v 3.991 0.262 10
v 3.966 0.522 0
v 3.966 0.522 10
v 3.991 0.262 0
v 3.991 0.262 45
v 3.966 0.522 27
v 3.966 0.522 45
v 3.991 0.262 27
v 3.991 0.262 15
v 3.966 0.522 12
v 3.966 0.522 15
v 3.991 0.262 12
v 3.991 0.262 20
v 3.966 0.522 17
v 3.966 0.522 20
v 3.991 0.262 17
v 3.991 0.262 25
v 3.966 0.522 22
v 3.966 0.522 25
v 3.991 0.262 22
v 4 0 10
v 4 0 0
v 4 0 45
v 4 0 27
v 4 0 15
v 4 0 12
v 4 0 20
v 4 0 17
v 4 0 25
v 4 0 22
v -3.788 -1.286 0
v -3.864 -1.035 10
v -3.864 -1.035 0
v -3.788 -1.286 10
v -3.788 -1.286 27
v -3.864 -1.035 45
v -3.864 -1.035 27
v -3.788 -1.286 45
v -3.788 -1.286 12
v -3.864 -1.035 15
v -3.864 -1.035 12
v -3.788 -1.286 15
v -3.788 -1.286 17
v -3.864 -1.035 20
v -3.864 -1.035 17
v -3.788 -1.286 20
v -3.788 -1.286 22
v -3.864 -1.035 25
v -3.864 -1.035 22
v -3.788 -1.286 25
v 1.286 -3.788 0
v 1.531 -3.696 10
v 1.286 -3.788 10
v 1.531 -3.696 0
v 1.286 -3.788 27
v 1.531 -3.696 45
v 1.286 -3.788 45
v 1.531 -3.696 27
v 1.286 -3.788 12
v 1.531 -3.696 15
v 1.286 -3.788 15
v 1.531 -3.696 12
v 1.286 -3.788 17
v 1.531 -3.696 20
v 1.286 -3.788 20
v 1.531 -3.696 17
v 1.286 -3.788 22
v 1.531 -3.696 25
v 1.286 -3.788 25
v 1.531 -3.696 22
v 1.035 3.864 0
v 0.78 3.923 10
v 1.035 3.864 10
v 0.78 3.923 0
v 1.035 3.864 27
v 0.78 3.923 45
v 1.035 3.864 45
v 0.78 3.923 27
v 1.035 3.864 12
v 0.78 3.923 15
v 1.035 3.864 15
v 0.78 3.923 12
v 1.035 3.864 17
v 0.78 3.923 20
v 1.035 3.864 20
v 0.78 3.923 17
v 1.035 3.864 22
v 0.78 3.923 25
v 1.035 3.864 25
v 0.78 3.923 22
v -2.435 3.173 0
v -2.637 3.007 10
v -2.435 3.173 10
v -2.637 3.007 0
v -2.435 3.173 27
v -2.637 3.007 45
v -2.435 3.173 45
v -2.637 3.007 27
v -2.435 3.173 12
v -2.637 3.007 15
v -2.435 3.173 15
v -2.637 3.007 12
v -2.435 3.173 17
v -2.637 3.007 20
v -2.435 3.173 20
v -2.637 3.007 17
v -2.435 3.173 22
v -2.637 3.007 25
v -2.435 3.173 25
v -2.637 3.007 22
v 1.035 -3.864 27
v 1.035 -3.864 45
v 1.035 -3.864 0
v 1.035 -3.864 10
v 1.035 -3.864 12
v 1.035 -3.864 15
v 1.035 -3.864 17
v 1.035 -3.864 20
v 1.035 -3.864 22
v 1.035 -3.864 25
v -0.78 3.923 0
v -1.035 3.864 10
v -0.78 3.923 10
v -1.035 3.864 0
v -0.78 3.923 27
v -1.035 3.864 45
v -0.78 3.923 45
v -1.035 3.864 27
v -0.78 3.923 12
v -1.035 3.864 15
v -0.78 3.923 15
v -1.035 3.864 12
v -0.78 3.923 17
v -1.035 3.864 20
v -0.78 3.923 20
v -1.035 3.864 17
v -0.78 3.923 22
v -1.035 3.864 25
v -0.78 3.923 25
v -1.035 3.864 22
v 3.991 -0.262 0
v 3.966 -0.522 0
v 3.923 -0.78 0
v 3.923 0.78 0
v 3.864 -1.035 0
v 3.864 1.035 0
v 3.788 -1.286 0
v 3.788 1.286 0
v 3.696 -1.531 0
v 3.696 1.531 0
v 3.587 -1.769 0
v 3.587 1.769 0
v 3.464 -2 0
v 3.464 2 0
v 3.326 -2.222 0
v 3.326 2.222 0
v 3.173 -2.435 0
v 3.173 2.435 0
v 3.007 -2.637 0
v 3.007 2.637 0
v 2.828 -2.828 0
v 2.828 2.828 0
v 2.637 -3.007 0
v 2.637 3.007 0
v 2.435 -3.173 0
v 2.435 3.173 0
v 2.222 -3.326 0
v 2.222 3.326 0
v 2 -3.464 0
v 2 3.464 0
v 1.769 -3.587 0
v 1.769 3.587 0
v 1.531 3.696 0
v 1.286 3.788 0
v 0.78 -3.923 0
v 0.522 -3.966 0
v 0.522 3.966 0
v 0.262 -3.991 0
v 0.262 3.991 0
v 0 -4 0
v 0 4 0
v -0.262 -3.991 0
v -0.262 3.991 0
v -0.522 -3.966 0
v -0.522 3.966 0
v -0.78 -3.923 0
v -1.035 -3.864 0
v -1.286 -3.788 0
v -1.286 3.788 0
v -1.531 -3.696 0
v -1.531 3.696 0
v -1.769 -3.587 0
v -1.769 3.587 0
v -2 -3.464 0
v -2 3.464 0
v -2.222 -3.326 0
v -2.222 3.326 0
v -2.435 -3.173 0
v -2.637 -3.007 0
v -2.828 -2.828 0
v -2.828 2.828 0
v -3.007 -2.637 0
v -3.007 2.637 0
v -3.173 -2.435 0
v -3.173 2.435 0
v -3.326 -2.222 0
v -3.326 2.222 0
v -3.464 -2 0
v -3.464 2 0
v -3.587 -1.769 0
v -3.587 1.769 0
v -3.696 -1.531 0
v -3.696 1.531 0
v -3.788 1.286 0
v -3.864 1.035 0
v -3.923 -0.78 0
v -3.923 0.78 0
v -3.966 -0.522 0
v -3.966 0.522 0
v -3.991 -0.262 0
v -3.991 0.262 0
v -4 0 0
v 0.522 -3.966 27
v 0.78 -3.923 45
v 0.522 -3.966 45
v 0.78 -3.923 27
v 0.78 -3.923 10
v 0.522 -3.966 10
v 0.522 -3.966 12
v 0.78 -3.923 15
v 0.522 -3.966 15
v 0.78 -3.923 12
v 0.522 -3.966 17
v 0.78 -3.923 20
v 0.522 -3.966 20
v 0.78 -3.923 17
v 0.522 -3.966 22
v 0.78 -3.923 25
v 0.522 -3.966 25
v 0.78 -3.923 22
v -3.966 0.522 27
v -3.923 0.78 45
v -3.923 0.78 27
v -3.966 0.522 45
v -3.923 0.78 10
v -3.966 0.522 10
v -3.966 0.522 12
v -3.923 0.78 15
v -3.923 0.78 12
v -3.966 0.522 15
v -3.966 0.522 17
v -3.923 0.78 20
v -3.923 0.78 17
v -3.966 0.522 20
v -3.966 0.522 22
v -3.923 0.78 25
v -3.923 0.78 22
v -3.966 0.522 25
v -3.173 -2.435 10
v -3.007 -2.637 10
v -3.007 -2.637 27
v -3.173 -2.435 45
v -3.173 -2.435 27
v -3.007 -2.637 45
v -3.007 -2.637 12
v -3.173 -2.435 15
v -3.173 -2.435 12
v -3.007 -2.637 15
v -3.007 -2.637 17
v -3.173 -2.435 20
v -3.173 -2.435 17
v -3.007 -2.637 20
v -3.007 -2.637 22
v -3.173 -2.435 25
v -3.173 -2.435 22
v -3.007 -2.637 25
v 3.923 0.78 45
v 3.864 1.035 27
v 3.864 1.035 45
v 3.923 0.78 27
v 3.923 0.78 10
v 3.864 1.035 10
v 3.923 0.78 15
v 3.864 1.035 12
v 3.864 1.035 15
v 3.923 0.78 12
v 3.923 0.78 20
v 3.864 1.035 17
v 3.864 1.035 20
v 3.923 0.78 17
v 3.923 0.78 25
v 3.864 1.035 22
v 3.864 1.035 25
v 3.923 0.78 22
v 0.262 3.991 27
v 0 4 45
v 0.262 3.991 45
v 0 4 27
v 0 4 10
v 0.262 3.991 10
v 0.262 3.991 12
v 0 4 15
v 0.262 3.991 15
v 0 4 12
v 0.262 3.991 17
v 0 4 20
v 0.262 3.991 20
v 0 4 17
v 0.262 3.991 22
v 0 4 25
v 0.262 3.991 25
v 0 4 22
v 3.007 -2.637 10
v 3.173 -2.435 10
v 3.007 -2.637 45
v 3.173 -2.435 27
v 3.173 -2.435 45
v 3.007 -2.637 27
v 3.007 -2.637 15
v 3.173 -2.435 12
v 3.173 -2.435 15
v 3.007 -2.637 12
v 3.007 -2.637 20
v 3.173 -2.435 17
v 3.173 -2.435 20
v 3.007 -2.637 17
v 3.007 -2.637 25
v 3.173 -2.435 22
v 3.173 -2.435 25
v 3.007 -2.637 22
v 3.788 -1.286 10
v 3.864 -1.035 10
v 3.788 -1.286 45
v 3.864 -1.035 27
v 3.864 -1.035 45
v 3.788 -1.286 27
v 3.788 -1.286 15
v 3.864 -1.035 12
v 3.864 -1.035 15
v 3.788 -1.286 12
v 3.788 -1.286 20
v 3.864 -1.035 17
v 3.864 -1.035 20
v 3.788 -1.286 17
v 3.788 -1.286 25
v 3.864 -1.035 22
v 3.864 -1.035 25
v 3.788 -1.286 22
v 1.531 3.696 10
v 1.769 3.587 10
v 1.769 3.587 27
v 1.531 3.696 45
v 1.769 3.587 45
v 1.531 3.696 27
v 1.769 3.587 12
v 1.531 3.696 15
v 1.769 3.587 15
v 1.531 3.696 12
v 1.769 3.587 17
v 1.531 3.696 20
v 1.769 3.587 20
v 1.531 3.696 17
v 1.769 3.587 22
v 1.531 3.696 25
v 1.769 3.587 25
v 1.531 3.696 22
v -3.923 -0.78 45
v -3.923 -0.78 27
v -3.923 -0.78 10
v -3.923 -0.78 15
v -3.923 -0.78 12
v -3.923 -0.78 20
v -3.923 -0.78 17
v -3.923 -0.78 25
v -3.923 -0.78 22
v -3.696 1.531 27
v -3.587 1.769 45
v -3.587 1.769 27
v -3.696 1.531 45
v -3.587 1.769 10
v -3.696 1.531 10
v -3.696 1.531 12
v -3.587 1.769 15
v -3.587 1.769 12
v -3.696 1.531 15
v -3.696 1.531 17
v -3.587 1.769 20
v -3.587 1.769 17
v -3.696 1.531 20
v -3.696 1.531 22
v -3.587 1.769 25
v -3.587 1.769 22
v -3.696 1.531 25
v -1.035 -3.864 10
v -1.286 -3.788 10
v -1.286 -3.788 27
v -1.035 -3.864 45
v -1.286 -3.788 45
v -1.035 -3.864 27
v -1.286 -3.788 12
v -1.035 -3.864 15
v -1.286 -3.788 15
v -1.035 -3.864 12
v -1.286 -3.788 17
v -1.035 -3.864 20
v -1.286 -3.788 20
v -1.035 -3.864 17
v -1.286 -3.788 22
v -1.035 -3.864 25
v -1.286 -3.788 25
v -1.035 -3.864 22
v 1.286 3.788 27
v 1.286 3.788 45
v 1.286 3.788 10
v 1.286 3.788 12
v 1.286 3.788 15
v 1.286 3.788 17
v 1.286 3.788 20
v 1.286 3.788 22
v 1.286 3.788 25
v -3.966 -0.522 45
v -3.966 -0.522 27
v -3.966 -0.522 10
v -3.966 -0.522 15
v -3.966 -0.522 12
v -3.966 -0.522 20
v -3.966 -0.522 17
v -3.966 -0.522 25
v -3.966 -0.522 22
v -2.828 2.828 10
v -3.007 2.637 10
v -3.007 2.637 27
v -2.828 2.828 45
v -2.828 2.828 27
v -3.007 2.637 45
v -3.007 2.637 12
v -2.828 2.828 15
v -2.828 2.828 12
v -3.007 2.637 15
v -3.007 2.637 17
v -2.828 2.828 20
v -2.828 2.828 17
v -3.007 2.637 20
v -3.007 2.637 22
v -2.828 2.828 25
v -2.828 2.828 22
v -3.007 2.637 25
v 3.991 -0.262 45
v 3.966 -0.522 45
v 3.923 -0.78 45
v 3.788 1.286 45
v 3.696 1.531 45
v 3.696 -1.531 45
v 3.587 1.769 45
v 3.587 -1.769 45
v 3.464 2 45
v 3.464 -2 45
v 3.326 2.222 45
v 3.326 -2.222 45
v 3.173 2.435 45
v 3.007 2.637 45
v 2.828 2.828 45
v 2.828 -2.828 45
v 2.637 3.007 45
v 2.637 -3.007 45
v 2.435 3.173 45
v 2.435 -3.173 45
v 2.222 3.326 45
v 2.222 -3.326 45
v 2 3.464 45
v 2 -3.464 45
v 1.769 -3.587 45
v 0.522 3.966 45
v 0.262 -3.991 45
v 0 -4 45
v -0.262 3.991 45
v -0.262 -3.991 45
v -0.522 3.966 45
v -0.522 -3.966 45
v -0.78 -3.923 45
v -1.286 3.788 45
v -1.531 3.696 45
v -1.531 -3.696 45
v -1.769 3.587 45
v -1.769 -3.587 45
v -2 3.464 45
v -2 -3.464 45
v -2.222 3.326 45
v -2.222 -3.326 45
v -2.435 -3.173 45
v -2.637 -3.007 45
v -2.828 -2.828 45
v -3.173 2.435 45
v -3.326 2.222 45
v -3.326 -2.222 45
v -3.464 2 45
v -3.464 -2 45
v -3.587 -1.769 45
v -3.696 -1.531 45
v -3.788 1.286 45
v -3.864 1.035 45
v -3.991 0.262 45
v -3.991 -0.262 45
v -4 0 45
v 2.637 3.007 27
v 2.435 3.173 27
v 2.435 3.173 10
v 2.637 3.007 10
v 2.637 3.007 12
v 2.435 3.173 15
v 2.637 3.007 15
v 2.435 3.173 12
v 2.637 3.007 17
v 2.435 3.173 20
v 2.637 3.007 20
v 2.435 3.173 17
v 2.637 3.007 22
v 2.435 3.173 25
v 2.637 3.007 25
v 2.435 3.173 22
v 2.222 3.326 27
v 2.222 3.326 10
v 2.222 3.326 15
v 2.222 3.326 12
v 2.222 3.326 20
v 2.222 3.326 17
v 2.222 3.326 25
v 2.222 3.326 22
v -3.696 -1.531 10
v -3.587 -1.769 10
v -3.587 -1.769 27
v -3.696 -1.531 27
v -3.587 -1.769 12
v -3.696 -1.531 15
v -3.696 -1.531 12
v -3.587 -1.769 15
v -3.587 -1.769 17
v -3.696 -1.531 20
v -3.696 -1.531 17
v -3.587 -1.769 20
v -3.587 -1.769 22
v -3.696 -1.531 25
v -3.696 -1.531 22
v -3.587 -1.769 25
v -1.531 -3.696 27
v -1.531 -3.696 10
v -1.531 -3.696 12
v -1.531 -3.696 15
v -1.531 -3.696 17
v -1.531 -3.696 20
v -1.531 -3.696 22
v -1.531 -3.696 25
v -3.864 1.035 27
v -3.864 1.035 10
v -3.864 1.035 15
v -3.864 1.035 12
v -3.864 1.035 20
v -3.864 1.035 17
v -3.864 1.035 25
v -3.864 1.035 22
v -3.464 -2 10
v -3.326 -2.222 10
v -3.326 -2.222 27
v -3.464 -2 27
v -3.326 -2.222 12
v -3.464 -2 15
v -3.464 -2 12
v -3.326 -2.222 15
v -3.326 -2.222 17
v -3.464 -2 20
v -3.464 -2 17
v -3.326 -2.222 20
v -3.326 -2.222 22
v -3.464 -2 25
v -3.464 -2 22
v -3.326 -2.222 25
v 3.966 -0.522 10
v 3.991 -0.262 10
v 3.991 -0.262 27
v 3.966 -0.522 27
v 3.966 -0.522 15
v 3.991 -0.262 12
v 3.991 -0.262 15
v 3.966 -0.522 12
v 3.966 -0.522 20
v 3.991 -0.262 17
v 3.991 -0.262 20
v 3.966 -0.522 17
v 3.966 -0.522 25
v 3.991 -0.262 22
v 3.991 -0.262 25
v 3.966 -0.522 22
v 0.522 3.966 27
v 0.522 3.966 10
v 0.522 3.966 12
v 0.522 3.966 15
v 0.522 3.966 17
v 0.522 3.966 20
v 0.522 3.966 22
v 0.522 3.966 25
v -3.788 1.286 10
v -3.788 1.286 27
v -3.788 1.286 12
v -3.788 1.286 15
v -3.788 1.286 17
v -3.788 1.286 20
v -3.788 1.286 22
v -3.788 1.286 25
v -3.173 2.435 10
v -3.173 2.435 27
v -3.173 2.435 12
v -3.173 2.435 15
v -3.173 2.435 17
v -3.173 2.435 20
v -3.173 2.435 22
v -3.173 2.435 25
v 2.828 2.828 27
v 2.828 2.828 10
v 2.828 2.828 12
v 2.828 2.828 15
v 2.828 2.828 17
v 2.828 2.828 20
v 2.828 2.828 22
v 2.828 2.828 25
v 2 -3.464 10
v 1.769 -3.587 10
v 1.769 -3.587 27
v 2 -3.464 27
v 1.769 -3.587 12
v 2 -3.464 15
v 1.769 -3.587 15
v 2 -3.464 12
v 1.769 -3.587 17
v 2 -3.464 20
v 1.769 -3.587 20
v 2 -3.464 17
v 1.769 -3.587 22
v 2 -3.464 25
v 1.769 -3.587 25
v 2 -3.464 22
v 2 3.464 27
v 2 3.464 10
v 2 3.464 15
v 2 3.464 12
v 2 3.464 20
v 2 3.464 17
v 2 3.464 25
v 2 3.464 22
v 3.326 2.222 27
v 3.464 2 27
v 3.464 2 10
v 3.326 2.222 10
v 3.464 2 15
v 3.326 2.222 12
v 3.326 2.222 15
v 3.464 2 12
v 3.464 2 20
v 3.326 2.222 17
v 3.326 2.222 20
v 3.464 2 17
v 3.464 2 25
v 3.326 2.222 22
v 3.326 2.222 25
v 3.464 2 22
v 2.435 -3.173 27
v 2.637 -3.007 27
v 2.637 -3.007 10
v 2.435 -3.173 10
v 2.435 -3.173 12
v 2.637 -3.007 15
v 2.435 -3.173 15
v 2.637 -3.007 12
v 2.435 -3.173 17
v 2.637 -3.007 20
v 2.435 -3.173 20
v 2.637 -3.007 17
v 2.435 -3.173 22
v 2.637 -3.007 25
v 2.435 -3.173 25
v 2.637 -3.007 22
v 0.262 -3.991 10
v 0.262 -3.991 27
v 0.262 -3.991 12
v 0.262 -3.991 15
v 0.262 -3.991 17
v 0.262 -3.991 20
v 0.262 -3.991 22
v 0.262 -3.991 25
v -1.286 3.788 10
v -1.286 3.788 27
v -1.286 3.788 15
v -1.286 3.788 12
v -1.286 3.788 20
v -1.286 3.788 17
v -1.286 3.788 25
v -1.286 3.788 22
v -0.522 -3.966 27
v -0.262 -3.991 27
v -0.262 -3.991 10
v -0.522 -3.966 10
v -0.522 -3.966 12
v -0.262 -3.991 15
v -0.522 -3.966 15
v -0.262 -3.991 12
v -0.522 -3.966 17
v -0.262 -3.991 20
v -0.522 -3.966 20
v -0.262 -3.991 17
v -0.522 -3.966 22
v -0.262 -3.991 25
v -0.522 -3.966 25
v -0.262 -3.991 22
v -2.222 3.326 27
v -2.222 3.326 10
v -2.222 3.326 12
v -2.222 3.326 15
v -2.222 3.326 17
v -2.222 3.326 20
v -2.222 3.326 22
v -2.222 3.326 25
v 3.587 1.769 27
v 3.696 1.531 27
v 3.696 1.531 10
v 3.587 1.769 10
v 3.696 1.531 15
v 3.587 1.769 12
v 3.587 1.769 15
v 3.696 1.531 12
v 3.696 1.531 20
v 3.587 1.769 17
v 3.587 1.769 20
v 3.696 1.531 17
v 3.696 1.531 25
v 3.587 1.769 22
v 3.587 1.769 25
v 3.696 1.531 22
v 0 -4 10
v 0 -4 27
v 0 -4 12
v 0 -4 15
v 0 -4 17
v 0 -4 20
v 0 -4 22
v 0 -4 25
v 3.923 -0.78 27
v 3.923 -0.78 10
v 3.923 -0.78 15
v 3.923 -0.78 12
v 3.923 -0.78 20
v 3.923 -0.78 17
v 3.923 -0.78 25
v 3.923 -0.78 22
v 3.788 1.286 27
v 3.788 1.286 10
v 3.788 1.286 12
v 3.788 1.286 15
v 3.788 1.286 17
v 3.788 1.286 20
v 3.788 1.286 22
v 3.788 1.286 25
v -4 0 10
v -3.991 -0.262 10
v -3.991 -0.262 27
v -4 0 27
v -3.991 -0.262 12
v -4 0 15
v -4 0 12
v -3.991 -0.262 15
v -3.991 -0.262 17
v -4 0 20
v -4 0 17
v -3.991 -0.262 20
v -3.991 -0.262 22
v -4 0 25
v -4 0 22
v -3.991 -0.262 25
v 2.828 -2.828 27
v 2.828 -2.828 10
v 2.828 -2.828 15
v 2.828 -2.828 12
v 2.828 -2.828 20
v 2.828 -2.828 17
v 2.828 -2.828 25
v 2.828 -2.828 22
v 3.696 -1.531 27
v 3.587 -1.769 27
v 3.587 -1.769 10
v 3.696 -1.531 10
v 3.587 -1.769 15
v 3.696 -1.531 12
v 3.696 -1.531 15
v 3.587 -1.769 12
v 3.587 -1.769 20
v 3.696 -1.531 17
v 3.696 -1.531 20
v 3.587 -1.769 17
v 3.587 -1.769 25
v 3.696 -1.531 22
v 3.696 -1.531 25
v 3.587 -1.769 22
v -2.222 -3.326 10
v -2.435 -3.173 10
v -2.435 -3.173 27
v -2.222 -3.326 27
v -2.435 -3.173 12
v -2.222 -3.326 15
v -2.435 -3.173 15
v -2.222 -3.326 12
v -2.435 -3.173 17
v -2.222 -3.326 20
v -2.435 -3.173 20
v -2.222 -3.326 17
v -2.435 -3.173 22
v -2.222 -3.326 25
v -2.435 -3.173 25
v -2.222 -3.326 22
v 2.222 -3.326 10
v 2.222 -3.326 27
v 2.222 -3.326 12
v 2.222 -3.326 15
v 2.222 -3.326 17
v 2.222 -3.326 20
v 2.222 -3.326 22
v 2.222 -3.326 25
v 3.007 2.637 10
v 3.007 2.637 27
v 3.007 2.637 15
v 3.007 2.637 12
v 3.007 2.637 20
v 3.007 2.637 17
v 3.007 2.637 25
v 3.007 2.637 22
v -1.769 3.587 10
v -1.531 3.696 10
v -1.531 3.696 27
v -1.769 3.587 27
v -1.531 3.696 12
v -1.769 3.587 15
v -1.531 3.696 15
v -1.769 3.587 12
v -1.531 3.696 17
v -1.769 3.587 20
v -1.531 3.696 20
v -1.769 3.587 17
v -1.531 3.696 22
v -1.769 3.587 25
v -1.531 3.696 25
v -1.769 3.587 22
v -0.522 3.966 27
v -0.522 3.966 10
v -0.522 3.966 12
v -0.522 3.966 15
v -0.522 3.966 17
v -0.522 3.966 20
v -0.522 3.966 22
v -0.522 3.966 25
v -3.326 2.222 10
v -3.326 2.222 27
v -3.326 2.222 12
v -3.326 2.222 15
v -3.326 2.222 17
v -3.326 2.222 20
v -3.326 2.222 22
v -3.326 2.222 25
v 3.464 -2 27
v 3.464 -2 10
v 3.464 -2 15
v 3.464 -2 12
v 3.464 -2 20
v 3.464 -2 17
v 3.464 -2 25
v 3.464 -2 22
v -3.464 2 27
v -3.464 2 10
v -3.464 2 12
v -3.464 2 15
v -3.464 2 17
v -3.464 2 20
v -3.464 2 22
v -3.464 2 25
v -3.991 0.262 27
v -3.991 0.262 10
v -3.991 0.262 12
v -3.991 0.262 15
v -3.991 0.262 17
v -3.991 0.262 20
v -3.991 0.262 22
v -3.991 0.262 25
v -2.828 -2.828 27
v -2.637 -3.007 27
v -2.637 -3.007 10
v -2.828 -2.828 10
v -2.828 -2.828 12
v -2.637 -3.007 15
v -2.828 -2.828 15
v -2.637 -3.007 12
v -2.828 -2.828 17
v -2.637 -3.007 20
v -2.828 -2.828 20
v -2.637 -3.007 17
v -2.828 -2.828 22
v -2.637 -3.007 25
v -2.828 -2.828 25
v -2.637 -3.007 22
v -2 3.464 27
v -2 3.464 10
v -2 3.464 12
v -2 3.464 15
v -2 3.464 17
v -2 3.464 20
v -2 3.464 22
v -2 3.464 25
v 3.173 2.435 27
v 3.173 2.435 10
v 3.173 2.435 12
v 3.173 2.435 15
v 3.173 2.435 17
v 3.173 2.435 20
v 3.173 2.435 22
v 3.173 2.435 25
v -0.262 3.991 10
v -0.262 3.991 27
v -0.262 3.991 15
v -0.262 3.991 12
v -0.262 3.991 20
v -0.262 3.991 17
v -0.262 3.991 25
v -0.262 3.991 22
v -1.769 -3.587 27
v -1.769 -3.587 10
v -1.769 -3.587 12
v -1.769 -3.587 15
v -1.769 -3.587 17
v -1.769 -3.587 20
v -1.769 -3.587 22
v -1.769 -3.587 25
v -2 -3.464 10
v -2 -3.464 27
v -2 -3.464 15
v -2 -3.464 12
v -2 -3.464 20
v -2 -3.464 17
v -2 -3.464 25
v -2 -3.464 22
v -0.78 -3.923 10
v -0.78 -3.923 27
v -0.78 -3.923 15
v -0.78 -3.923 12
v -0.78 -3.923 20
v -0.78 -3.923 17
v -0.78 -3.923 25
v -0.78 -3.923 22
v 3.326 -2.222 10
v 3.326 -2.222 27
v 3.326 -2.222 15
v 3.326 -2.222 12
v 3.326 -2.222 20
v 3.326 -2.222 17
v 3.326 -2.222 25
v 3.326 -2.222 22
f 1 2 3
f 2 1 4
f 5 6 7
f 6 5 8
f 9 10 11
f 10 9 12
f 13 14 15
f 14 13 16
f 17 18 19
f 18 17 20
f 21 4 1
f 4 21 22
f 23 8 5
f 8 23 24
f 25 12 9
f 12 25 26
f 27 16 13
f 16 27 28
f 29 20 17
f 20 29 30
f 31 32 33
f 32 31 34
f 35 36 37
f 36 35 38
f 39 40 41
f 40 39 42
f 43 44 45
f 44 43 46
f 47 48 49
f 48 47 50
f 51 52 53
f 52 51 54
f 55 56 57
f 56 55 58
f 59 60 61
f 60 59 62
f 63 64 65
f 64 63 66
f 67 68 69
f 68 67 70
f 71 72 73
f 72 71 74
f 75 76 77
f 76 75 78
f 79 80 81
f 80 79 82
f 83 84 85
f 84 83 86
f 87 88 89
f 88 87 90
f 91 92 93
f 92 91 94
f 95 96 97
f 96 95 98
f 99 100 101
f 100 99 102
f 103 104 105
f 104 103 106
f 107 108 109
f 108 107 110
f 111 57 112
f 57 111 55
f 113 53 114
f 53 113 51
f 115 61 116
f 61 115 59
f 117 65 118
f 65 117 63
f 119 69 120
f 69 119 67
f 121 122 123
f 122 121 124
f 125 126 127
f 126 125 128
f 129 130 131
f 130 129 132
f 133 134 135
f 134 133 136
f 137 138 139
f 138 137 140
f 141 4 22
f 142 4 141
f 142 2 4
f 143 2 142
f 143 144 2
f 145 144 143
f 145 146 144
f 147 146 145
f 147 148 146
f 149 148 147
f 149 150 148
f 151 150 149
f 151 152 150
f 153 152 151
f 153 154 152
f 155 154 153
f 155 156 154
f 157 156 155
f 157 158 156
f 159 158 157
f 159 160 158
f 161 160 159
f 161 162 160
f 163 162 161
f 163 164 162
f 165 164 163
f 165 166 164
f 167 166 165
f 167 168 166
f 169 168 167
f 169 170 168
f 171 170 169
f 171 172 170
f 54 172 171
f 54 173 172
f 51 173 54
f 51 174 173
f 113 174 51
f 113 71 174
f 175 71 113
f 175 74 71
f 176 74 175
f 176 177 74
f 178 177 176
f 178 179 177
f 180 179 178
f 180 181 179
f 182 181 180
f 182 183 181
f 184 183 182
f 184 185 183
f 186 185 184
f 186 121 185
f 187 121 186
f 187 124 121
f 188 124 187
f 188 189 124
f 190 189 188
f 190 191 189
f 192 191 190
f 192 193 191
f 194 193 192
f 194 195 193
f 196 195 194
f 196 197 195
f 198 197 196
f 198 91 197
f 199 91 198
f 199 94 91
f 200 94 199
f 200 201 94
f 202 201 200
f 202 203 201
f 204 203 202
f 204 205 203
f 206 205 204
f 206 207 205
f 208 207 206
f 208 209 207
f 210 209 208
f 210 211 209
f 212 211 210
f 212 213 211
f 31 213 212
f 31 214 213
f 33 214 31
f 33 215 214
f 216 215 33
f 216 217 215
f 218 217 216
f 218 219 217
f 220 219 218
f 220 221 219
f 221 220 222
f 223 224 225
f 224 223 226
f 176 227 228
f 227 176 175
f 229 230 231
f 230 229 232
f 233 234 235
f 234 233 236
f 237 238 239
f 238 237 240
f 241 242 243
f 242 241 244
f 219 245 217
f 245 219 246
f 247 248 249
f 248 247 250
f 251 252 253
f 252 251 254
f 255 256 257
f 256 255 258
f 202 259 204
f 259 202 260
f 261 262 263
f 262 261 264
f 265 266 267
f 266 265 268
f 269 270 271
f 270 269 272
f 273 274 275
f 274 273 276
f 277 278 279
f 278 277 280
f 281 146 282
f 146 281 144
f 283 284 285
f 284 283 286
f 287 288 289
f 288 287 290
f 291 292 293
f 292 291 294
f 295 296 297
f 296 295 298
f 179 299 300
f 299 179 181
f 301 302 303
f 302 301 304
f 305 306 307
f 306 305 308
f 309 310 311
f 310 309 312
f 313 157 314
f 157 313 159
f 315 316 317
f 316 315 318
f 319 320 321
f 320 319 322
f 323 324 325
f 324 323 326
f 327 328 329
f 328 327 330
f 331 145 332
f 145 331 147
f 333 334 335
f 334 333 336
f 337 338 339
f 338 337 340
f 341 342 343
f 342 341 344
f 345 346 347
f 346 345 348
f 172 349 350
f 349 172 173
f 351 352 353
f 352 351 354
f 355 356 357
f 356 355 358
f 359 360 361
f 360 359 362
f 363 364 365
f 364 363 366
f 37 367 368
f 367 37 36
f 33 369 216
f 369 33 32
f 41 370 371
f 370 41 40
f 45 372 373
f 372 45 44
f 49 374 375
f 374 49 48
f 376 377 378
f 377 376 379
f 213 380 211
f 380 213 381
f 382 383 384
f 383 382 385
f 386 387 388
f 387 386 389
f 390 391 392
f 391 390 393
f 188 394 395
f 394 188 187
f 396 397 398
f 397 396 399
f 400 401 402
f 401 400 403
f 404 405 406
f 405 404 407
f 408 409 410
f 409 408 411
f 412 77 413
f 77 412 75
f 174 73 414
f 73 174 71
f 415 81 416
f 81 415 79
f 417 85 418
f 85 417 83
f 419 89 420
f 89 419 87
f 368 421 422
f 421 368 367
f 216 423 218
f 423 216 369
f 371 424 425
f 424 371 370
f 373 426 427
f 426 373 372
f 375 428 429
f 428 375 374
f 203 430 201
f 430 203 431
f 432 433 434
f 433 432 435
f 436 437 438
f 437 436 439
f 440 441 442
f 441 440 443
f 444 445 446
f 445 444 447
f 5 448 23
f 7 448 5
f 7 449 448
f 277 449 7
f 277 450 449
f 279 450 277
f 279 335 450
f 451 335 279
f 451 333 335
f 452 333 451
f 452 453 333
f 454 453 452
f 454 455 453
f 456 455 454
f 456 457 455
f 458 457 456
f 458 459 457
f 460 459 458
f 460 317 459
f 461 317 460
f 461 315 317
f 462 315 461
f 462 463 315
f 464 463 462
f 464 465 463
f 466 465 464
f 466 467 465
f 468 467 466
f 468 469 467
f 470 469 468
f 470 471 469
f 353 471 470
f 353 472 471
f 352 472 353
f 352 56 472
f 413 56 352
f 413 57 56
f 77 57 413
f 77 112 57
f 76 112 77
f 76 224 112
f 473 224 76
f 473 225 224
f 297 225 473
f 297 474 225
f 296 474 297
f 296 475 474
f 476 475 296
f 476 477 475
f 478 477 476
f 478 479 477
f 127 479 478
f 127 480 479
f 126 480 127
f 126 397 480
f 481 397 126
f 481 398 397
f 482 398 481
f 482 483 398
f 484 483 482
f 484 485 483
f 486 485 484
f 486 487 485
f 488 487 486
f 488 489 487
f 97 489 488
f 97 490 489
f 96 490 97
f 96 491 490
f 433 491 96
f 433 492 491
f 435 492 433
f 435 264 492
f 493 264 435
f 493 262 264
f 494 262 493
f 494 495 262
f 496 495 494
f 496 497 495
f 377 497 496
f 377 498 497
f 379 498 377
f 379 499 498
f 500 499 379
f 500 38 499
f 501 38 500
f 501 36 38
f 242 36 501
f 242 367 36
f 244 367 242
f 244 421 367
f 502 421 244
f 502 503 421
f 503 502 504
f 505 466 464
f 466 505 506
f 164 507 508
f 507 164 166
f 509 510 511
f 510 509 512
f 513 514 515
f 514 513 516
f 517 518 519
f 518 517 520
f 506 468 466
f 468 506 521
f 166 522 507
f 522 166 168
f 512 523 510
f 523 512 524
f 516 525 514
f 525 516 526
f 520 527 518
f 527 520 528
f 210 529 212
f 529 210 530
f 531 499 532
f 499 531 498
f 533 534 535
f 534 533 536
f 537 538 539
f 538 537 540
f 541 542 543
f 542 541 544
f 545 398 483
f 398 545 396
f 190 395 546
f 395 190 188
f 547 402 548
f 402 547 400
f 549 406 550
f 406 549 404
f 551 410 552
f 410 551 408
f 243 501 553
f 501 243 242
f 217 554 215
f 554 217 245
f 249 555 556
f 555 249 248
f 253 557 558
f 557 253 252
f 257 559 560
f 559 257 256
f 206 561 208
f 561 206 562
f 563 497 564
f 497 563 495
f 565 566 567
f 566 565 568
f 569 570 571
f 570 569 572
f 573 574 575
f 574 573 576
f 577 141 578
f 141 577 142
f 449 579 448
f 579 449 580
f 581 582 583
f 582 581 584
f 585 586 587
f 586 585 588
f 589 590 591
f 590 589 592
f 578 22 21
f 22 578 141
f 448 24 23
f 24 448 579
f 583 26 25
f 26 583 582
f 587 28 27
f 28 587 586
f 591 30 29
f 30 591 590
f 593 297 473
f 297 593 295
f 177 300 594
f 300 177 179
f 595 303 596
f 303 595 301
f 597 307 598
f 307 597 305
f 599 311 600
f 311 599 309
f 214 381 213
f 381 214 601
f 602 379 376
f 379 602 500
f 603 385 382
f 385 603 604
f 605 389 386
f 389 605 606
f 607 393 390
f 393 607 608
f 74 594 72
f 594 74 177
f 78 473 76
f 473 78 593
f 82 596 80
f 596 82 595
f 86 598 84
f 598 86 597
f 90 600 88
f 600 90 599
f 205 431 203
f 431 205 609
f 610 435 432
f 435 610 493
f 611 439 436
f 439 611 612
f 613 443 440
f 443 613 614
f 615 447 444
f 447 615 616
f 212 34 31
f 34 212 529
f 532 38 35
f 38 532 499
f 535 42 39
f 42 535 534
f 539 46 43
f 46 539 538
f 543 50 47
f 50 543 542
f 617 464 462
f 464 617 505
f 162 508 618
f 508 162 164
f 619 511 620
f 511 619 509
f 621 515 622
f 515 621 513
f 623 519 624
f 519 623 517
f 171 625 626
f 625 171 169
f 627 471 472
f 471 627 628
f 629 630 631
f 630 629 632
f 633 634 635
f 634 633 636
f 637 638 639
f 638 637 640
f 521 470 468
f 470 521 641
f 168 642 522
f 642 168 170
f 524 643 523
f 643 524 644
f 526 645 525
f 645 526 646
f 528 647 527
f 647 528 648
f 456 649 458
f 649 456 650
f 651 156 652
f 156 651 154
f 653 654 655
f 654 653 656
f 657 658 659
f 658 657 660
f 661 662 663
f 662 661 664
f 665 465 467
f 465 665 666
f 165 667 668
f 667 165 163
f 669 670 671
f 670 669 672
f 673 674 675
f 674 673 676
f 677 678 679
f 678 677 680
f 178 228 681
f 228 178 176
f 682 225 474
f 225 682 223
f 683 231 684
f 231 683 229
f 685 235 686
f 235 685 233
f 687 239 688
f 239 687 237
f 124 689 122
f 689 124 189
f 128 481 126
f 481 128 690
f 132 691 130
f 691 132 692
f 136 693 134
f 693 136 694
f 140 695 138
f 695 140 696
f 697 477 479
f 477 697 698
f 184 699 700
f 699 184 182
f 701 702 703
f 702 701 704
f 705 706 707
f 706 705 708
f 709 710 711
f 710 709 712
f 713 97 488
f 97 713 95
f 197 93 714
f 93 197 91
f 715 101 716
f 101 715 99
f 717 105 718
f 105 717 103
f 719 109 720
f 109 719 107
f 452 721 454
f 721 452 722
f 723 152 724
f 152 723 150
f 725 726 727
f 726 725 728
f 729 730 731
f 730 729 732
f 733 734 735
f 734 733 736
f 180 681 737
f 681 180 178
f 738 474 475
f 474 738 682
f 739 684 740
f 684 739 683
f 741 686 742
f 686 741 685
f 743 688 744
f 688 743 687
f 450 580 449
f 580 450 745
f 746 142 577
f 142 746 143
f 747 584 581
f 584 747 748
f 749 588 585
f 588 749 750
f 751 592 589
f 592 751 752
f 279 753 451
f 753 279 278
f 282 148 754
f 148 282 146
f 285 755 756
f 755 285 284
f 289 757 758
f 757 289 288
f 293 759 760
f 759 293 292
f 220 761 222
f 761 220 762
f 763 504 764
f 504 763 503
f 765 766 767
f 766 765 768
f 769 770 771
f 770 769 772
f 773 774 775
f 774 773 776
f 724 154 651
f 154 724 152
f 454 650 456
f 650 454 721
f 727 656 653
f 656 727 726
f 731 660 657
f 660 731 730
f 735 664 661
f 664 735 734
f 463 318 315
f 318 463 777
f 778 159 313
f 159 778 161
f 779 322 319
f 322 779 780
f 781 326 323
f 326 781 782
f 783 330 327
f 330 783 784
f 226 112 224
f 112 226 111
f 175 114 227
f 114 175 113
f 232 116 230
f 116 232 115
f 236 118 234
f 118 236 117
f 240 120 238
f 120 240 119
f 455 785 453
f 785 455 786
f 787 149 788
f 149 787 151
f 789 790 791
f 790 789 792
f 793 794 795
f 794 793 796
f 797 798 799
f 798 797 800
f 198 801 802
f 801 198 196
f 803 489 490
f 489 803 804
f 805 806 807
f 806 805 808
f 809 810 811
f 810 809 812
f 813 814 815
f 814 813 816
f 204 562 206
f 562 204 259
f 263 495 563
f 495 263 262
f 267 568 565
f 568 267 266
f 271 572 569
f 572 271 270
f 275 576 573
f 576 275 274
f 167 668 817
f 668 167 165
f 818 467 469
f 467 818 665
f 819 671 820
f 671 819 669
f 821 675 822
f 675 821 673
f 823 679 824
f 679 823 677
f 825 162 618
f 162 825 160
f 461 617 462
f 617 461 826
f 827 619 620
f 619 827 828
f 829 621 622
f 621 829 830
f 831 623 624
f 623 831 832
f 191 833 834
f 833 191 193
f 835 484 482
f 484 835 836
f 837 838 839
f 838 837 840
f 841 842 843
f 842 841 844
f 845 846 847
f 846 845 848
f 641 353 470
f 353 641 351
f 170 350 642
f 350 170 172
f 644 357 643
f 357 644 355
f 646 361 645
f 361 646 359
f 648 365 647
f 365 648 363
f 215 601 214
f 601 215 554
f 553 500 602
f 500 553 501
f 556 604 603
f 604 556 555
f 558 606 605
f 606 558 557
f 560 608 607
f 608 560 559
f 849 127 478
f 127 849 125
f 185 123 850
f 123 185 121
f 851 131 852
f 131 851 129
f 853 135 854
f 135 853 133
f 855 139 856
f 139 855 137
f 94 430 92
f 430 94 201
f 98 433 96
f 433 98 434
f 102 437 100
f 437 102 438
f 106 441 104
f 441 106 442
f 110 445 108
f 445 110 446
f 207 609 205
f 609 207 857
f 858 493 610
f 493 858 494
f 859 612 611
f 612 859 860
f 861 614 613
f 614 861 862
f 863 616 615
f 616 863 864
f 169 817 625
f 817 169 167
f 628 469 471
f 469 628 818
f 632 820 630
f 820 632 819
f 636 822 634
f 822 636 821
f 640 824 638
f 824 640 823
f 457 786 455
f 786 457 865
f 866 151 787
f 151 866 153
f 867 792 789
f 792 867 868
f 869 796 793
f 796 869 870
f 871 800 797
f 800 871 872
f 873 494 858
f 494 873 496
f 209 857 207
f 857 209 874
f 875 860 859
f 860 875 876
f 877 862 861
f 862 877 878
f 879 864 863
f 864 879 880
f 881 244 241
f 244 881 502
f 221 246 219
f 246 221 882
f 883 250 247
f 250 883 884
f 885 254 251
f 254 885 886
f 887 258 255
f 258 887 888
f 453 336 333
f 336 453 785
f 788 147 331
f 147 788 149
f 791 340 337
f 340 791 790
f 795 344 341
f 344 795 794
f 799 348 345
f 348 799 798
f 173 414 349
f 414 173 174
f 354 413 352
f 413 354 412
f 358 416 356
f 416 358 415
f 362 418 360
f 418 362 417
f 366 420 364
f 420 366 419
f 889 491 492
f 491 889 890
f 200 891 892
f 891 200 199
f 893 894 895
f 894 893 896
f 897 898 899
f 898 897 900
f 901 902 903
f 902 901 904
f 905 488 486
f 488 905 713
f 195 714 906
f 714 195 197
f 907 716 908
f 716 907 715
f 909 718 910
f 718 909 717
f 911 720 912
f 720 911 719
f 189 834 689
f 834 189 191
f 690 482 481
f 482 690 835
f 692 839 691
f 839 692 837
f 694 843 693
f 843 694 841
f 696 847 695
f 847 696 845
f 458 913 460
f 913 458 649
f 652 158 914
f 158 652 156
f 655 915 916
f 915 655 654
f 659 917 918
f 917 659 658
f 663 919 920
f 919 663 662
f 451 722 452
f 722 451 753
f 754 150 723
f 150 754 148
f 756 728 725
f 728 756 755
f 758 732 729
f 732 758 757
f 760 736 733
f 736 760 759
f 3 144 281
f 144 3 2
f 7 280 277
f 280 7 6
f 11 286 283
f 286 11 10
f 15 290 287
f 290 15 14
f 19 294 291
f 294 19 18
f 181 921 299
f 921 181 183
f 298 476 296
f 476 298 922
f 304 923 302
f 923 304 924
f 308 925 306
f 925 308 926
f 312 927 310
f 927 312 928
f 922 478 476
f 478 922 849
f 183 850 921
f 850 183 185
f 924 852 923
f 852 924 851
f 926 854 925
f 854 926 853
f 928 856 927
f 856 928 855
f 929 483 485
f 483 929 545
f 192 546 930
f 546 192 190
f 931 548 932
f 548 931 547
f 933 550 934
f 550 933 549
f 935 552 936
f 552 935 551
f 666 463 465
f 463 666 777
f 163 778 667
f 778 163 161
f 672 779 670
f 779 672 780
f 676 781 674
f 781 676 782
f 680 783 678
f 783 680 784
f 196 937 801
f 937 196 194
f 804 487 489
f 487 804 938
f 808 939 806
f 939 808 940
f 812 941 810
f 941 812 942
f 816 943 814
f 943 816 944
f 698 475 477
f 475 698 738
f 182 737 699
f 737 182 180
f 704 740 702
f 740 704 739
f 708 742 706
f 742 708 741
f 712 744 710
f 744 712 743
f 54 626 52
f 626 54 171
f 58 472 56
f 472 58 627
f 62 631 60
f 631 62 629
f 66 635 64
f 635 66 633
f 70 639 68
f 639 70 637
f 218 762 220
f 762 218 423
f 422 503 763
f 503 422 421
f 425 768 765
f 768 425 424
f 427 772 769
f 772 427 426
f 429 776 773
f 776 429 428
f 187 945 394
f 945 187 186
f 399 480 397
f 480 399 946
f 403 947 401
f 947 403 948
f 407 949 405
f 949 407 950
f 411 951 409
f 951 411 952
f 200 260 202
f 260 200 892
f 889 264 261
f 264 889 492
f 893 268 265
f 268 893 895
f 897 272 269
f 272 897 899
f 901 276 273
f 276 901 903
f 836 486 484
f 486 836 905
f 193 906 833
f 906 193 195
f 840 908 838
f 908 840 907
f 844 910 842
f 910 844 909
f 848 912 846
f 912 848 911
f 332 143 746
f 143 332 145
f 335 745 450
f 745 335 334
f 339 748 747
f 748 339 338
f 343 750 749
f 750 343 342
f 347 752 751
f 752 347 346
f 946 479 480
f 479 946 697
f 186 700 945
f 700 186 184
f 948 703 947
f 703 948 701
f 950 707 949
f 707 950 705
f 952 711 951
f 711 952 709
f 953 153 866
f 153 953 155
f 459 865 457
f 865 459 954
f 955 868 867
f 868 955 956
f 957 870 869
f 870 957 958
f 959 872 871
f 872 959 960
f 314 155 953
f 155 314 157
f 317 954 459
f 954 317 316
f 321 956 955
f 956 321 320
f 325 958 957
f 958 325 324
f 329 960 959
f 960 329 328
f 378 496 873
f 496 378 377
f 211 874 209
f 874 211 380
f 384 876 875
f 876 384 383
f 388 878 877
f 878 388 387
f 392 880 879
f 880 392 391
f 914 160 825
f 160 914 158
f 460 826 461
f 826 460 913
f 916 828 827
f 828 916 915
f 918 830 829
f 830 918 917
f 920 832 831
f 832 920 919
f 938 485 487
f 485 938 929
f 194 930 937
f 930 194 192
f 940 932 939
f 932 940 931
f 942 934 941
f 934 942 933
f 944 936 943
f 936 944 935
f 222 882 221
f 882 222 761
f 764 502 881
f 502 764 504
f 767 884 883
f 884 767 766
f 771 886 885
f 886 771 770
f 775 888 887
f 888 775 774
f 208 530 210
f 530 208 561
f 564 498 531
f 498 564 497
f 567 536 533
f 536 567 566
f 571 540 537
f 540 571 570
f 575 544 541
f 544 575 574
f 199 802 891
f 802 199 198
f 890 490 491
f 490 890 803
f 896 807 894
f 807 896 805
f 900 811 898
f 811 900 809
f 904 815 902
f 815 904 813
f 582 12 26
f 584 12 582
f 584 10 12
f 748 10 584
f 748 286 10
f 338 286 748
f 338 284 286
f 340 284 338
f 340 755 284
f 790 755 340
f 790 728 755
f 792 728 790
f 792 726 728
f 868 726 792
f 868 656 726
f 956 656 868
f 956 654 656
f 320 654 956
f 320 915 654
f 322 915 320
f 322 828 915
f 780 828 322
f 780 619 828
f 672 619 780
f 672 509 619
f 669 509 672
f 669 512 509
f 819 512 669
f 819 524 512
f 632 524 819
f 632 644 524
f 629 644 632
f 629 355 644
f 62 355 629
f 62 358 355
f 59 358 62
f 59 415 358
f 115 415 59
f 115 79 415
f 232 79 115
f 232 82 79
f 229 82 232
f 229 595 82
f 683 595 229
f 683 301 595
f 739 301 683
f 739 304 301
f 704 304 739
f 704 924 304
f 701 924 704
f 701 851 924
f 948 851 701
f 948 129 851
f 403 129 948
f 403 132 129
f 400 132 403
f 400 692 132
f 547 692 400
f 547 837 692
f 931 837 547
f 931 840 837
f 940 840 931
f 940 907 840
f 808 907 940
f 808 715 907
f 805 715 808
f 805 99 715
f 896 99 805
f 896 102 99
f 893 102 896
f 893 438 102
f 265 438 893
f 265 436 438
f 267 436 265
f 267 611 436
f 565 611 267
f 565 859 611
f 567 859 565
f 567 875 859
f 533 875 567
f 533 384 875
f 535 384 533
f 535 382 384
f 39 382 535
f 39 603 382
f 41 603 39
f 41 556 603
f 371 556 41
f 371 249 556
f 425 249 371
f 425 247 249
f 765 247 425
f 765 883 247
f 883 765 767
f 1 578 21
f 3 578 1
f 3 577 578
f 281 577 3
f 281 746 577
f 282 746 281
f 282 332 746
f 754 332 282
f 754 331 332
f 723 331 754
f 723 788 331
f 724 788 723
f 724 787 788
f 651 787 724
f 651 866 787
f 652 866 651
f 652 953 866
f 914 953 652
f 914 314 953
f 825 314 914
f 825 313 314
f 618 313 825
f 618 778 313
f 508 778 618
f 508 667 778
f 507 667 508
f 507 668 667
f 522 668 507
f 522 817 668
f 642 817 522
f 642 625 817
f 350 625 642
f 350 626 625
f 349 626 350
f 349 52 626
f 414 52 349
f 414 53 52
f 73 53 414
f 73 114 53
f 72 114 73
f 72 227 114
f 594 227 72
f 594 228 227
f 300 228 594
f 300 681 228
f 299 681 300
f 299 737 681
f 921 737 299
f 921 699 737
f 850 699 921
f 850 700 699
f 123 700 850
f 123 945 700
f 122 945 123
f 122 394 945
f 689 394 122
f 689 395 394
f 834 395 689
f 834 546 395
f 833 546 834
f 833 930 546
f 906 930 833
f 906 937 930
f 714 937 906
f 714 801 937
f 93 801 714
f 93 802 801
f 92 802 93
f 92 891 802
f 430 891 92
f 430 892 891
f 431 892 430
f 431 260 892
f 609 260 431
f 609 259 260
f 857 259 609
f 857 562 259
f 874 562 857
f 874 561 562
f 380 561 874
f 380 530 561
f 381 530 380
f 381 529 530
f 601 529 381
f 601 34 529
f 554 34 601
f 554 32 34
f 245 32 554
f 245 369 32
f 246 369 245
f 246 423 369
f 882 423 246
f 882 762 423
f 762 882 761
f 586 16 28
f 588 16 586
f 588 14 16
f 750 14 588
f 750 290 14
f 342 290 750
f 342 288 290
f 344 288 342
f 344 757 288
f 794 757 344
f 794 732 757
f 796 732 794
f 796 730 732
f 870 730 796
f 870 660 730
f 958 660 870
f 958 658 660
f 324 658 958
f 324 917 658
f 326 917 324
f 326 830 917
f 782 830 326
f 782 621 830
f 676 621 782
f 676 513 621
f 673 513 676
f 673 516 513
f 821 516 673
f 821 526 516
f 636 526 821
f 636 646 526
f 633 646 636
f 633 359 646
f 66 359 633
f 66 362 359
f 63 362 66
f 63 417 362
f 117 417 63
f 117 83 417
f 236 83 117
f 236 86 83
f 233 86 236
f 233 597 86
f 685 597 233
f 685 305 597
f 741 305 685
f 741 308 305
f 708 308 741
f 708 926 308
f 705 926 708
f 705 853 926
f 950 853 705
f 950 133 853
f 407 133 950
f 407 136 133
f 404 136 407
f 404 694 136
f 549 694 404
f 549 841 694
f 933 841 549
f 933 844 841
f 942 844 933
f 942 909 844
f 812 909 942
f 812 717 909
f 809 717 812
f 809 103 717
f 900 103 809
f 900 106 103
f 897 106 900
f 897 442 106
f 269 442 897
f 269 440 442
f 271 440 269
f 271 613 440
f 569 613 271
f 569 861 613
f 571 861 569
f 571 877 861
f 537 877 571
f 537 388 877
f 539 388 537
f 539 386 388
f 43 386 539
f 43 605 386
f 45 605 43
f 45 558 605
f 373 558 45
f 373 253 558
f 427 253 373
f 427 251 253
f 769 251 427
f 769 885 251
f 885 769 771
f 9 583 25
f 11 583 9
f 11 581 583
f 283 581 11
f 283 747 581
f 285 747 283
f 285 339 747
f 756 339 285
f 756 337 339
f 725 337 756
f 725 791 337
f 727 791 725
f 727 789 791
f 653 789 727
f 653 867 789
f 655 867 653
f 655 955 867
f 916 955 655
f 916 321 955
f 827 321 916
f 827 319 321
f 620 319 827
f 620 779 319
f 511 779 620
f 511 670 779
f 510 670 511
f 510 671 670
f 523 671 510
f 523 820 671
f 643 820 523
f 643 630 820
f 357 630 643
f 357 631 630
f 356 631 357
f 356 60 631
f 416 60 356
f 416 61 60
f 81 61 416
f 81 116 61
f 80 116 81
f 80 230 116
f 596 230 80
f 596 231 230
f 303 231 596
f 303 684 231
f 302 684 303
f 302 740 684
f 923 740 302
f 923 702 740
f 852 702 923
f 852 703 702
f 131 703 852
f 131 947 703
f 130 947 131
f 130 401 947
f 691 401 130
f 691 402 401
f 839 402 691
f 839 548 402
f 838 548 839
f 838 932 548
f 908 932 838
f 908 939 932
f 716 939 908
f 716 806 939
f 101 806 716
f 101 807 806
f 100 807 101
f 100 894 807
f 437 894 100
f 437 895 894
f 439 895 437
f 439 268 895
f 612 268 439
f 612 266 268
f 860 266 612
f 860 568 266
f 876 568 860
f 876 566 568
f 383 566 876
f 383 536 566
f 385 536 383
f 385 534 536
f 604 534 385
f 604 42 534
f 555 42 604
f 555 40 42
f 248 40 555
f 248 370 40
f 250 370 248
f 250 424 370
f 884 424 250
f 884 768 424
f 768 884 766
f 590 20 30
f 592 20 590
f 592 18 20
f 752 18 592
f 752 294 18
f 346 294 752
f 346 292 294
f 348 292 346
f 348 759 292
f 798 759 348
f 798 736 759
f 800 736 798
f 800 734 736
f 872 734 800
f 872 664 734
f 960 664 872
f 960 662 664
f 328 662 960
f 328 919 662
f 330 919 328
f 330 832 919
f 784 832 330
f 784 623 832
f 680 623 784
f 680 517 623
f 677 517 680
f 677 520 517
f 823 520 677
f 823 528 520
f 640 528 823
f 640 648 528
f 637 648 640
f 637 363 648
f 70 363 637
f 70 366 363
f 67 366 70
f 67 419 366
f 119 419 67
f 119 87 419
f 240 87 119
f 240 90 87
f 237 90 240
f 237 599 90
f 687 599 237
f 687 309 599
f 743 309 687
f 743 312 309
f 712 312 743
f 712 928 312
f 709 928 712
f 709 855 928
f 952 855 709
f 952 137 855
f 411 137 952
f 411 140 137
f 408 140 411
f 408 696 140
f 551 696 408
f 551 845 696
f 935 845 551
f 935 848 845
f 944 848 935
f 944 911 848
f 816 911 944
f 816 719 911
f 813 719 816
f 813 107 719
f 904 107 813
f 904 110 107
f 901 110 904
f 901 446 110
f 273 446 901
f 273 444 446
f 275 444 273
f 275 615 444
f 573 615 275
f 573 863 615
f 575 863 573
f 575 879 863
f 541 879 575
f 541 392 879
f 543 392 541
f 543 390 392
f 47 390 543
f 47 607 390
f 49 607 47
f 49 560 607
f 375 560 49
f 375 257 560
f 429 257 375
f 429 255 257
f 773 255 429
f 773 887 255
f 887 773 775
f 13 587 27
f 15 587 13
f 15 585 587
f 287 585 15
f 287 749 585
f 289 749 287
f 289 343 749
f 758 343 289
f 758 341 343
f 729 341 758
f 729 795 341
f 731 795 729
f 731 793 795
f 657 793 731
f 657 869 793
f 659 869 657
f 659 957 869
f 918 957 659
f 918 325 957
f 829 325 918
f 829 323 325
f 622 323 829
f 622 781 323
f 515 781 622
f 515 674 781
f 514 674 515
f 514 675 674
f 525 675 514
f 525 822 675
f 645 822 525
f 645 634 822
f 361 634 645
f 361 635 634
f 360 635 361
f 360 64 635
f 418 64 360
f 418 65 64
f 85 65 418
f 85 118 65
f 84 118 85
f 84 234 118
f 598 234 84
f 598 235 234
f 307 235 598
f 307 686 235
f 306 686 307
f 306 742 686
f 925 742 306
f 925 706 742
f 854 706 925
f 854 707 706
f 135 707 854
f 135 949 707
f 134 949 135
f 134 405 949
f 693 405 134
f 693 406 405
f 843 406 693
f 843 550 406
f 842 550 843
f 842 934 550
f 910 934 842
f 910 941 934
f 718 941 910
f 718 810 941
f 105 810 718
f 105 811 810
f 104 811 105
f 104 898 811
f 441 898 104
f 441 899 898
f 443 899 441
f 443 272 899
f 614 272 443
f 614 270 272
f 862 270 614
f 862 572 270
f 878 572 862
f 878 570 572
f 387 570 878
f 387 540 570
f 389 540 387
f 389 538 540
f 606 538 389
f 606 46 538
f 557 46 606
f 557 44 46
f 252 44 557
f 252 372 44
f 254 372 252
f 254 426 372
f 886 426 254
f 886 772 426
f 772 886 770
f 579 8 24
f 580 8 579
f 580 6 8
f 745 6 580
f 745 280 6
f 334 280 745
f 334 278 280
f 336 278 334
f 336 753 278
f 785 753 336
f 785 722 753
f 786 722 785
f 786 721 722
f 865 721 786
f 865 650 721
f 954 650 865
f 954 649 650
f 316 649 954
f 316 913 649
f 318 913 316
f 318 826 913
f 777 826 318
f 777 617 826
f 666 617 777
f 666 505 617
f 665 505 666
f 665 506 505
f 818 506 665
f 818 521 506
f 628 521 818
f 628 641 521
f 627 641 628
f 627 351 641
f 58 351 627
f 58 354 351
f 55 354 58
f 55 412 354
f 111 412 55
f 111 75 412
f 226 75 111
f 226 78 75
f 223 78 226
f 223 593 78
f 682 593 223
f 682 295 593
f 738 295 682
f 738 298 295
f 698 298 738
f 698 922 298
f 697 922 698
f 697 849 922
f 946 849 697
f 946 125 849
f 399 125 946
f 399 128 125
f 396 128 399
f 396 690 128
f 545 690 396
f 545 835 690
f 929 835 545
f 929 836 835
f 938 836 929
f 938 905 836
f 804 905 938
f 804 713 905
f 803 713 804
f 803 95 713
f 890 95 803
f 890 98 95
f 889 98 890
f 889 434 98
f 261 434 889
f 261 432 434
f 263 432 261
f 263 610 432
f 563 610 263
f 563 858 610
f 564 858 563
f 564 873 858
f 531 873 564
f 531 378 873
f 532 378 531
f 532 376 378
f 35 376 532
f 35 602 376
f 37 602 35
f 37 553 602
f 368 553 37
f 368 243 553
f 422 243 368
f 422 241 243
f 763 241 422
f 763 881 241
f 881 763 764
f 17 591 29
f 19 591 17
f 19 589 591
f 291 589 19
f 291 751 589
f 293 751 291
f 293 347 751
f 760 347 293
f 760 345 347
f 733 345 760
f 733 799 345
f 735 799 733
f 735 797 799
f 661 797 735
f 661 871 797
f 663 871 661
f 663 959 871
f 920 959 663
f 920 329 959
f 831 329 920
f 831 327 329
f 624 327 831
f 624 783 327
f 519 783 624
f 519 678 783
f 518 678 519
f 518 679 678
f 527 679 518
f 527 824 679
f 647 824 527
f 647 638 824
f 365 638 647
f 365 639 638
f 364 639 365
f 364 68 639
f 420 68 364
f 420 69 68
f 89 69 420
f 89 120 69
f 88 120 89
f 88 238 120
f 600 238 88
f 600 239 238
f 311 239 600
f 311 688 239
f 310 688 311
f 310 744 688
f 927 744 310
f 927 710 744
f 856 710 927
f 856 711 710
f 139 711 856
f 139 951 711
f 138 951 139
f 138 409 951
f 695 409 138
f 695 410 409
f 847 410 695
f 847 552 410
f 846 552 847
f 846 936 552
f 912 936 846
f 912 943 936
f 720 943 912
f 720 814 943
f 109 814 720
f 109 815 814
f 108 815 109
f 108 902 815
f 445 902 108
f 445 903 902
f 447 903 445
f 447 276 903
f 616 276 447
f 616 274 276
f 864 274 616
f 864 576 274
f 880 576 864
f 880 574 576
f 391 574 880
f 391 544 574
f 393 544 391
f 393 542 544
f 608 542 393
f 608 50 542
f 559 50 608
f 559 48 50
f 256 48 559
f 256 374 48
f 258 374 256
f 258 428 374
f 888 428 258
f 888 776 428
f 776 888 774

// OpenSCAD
// Tissue-pestle for 1.5 mL microcentrifuge tube
// Print orientation: standing upright, handle on the bed

// ---- Dimensions (mm) ----
handle_d      = 8;     // handle diameter
handle_h      = 45;    // handle height (z = 0 to 45)
cone_top_d    = 8;     // cone diameter at top of handle (z = 45)
cone_tip_d    = 3;     // cone diameter at tip (z = 62)
tip_r         = 1.5;   // rounded tip radius (sphere centred at z = 62)
groove_w      = 2;     // groove width (Z)
groove_depth  = 1;     // groove depth from handle surface
groove_z      = [10, 15, 20, 25]; // groove centre heights

eps           = 0.5;   // cutter overshoot past faces
$fn           = 96;    // curve resolution

// ---- Model ----
difference() {
    union() {
        // Handle
        cylinder(d = handle_d, h = handle_h);
        // Tapering cone (z = 45 to 62)
        translate([0, 0, handle_h])
            cylinder(d1 = cone_top_d, d2 = cone_tip_d, h = cone_tip_d - cone_top_d + eps);
        // Rounded tip
        translate([0, 0, handle_h + cone_tip_d - cone_top_d])
            sphere(r = tip_r);
    }
    // Grip grooves
    for (z = groove_z)
        translate([0, 0, z])
            cylinder(d = handle_d + 2 * eps, h = groove_w, depth = groove_depth);
}
